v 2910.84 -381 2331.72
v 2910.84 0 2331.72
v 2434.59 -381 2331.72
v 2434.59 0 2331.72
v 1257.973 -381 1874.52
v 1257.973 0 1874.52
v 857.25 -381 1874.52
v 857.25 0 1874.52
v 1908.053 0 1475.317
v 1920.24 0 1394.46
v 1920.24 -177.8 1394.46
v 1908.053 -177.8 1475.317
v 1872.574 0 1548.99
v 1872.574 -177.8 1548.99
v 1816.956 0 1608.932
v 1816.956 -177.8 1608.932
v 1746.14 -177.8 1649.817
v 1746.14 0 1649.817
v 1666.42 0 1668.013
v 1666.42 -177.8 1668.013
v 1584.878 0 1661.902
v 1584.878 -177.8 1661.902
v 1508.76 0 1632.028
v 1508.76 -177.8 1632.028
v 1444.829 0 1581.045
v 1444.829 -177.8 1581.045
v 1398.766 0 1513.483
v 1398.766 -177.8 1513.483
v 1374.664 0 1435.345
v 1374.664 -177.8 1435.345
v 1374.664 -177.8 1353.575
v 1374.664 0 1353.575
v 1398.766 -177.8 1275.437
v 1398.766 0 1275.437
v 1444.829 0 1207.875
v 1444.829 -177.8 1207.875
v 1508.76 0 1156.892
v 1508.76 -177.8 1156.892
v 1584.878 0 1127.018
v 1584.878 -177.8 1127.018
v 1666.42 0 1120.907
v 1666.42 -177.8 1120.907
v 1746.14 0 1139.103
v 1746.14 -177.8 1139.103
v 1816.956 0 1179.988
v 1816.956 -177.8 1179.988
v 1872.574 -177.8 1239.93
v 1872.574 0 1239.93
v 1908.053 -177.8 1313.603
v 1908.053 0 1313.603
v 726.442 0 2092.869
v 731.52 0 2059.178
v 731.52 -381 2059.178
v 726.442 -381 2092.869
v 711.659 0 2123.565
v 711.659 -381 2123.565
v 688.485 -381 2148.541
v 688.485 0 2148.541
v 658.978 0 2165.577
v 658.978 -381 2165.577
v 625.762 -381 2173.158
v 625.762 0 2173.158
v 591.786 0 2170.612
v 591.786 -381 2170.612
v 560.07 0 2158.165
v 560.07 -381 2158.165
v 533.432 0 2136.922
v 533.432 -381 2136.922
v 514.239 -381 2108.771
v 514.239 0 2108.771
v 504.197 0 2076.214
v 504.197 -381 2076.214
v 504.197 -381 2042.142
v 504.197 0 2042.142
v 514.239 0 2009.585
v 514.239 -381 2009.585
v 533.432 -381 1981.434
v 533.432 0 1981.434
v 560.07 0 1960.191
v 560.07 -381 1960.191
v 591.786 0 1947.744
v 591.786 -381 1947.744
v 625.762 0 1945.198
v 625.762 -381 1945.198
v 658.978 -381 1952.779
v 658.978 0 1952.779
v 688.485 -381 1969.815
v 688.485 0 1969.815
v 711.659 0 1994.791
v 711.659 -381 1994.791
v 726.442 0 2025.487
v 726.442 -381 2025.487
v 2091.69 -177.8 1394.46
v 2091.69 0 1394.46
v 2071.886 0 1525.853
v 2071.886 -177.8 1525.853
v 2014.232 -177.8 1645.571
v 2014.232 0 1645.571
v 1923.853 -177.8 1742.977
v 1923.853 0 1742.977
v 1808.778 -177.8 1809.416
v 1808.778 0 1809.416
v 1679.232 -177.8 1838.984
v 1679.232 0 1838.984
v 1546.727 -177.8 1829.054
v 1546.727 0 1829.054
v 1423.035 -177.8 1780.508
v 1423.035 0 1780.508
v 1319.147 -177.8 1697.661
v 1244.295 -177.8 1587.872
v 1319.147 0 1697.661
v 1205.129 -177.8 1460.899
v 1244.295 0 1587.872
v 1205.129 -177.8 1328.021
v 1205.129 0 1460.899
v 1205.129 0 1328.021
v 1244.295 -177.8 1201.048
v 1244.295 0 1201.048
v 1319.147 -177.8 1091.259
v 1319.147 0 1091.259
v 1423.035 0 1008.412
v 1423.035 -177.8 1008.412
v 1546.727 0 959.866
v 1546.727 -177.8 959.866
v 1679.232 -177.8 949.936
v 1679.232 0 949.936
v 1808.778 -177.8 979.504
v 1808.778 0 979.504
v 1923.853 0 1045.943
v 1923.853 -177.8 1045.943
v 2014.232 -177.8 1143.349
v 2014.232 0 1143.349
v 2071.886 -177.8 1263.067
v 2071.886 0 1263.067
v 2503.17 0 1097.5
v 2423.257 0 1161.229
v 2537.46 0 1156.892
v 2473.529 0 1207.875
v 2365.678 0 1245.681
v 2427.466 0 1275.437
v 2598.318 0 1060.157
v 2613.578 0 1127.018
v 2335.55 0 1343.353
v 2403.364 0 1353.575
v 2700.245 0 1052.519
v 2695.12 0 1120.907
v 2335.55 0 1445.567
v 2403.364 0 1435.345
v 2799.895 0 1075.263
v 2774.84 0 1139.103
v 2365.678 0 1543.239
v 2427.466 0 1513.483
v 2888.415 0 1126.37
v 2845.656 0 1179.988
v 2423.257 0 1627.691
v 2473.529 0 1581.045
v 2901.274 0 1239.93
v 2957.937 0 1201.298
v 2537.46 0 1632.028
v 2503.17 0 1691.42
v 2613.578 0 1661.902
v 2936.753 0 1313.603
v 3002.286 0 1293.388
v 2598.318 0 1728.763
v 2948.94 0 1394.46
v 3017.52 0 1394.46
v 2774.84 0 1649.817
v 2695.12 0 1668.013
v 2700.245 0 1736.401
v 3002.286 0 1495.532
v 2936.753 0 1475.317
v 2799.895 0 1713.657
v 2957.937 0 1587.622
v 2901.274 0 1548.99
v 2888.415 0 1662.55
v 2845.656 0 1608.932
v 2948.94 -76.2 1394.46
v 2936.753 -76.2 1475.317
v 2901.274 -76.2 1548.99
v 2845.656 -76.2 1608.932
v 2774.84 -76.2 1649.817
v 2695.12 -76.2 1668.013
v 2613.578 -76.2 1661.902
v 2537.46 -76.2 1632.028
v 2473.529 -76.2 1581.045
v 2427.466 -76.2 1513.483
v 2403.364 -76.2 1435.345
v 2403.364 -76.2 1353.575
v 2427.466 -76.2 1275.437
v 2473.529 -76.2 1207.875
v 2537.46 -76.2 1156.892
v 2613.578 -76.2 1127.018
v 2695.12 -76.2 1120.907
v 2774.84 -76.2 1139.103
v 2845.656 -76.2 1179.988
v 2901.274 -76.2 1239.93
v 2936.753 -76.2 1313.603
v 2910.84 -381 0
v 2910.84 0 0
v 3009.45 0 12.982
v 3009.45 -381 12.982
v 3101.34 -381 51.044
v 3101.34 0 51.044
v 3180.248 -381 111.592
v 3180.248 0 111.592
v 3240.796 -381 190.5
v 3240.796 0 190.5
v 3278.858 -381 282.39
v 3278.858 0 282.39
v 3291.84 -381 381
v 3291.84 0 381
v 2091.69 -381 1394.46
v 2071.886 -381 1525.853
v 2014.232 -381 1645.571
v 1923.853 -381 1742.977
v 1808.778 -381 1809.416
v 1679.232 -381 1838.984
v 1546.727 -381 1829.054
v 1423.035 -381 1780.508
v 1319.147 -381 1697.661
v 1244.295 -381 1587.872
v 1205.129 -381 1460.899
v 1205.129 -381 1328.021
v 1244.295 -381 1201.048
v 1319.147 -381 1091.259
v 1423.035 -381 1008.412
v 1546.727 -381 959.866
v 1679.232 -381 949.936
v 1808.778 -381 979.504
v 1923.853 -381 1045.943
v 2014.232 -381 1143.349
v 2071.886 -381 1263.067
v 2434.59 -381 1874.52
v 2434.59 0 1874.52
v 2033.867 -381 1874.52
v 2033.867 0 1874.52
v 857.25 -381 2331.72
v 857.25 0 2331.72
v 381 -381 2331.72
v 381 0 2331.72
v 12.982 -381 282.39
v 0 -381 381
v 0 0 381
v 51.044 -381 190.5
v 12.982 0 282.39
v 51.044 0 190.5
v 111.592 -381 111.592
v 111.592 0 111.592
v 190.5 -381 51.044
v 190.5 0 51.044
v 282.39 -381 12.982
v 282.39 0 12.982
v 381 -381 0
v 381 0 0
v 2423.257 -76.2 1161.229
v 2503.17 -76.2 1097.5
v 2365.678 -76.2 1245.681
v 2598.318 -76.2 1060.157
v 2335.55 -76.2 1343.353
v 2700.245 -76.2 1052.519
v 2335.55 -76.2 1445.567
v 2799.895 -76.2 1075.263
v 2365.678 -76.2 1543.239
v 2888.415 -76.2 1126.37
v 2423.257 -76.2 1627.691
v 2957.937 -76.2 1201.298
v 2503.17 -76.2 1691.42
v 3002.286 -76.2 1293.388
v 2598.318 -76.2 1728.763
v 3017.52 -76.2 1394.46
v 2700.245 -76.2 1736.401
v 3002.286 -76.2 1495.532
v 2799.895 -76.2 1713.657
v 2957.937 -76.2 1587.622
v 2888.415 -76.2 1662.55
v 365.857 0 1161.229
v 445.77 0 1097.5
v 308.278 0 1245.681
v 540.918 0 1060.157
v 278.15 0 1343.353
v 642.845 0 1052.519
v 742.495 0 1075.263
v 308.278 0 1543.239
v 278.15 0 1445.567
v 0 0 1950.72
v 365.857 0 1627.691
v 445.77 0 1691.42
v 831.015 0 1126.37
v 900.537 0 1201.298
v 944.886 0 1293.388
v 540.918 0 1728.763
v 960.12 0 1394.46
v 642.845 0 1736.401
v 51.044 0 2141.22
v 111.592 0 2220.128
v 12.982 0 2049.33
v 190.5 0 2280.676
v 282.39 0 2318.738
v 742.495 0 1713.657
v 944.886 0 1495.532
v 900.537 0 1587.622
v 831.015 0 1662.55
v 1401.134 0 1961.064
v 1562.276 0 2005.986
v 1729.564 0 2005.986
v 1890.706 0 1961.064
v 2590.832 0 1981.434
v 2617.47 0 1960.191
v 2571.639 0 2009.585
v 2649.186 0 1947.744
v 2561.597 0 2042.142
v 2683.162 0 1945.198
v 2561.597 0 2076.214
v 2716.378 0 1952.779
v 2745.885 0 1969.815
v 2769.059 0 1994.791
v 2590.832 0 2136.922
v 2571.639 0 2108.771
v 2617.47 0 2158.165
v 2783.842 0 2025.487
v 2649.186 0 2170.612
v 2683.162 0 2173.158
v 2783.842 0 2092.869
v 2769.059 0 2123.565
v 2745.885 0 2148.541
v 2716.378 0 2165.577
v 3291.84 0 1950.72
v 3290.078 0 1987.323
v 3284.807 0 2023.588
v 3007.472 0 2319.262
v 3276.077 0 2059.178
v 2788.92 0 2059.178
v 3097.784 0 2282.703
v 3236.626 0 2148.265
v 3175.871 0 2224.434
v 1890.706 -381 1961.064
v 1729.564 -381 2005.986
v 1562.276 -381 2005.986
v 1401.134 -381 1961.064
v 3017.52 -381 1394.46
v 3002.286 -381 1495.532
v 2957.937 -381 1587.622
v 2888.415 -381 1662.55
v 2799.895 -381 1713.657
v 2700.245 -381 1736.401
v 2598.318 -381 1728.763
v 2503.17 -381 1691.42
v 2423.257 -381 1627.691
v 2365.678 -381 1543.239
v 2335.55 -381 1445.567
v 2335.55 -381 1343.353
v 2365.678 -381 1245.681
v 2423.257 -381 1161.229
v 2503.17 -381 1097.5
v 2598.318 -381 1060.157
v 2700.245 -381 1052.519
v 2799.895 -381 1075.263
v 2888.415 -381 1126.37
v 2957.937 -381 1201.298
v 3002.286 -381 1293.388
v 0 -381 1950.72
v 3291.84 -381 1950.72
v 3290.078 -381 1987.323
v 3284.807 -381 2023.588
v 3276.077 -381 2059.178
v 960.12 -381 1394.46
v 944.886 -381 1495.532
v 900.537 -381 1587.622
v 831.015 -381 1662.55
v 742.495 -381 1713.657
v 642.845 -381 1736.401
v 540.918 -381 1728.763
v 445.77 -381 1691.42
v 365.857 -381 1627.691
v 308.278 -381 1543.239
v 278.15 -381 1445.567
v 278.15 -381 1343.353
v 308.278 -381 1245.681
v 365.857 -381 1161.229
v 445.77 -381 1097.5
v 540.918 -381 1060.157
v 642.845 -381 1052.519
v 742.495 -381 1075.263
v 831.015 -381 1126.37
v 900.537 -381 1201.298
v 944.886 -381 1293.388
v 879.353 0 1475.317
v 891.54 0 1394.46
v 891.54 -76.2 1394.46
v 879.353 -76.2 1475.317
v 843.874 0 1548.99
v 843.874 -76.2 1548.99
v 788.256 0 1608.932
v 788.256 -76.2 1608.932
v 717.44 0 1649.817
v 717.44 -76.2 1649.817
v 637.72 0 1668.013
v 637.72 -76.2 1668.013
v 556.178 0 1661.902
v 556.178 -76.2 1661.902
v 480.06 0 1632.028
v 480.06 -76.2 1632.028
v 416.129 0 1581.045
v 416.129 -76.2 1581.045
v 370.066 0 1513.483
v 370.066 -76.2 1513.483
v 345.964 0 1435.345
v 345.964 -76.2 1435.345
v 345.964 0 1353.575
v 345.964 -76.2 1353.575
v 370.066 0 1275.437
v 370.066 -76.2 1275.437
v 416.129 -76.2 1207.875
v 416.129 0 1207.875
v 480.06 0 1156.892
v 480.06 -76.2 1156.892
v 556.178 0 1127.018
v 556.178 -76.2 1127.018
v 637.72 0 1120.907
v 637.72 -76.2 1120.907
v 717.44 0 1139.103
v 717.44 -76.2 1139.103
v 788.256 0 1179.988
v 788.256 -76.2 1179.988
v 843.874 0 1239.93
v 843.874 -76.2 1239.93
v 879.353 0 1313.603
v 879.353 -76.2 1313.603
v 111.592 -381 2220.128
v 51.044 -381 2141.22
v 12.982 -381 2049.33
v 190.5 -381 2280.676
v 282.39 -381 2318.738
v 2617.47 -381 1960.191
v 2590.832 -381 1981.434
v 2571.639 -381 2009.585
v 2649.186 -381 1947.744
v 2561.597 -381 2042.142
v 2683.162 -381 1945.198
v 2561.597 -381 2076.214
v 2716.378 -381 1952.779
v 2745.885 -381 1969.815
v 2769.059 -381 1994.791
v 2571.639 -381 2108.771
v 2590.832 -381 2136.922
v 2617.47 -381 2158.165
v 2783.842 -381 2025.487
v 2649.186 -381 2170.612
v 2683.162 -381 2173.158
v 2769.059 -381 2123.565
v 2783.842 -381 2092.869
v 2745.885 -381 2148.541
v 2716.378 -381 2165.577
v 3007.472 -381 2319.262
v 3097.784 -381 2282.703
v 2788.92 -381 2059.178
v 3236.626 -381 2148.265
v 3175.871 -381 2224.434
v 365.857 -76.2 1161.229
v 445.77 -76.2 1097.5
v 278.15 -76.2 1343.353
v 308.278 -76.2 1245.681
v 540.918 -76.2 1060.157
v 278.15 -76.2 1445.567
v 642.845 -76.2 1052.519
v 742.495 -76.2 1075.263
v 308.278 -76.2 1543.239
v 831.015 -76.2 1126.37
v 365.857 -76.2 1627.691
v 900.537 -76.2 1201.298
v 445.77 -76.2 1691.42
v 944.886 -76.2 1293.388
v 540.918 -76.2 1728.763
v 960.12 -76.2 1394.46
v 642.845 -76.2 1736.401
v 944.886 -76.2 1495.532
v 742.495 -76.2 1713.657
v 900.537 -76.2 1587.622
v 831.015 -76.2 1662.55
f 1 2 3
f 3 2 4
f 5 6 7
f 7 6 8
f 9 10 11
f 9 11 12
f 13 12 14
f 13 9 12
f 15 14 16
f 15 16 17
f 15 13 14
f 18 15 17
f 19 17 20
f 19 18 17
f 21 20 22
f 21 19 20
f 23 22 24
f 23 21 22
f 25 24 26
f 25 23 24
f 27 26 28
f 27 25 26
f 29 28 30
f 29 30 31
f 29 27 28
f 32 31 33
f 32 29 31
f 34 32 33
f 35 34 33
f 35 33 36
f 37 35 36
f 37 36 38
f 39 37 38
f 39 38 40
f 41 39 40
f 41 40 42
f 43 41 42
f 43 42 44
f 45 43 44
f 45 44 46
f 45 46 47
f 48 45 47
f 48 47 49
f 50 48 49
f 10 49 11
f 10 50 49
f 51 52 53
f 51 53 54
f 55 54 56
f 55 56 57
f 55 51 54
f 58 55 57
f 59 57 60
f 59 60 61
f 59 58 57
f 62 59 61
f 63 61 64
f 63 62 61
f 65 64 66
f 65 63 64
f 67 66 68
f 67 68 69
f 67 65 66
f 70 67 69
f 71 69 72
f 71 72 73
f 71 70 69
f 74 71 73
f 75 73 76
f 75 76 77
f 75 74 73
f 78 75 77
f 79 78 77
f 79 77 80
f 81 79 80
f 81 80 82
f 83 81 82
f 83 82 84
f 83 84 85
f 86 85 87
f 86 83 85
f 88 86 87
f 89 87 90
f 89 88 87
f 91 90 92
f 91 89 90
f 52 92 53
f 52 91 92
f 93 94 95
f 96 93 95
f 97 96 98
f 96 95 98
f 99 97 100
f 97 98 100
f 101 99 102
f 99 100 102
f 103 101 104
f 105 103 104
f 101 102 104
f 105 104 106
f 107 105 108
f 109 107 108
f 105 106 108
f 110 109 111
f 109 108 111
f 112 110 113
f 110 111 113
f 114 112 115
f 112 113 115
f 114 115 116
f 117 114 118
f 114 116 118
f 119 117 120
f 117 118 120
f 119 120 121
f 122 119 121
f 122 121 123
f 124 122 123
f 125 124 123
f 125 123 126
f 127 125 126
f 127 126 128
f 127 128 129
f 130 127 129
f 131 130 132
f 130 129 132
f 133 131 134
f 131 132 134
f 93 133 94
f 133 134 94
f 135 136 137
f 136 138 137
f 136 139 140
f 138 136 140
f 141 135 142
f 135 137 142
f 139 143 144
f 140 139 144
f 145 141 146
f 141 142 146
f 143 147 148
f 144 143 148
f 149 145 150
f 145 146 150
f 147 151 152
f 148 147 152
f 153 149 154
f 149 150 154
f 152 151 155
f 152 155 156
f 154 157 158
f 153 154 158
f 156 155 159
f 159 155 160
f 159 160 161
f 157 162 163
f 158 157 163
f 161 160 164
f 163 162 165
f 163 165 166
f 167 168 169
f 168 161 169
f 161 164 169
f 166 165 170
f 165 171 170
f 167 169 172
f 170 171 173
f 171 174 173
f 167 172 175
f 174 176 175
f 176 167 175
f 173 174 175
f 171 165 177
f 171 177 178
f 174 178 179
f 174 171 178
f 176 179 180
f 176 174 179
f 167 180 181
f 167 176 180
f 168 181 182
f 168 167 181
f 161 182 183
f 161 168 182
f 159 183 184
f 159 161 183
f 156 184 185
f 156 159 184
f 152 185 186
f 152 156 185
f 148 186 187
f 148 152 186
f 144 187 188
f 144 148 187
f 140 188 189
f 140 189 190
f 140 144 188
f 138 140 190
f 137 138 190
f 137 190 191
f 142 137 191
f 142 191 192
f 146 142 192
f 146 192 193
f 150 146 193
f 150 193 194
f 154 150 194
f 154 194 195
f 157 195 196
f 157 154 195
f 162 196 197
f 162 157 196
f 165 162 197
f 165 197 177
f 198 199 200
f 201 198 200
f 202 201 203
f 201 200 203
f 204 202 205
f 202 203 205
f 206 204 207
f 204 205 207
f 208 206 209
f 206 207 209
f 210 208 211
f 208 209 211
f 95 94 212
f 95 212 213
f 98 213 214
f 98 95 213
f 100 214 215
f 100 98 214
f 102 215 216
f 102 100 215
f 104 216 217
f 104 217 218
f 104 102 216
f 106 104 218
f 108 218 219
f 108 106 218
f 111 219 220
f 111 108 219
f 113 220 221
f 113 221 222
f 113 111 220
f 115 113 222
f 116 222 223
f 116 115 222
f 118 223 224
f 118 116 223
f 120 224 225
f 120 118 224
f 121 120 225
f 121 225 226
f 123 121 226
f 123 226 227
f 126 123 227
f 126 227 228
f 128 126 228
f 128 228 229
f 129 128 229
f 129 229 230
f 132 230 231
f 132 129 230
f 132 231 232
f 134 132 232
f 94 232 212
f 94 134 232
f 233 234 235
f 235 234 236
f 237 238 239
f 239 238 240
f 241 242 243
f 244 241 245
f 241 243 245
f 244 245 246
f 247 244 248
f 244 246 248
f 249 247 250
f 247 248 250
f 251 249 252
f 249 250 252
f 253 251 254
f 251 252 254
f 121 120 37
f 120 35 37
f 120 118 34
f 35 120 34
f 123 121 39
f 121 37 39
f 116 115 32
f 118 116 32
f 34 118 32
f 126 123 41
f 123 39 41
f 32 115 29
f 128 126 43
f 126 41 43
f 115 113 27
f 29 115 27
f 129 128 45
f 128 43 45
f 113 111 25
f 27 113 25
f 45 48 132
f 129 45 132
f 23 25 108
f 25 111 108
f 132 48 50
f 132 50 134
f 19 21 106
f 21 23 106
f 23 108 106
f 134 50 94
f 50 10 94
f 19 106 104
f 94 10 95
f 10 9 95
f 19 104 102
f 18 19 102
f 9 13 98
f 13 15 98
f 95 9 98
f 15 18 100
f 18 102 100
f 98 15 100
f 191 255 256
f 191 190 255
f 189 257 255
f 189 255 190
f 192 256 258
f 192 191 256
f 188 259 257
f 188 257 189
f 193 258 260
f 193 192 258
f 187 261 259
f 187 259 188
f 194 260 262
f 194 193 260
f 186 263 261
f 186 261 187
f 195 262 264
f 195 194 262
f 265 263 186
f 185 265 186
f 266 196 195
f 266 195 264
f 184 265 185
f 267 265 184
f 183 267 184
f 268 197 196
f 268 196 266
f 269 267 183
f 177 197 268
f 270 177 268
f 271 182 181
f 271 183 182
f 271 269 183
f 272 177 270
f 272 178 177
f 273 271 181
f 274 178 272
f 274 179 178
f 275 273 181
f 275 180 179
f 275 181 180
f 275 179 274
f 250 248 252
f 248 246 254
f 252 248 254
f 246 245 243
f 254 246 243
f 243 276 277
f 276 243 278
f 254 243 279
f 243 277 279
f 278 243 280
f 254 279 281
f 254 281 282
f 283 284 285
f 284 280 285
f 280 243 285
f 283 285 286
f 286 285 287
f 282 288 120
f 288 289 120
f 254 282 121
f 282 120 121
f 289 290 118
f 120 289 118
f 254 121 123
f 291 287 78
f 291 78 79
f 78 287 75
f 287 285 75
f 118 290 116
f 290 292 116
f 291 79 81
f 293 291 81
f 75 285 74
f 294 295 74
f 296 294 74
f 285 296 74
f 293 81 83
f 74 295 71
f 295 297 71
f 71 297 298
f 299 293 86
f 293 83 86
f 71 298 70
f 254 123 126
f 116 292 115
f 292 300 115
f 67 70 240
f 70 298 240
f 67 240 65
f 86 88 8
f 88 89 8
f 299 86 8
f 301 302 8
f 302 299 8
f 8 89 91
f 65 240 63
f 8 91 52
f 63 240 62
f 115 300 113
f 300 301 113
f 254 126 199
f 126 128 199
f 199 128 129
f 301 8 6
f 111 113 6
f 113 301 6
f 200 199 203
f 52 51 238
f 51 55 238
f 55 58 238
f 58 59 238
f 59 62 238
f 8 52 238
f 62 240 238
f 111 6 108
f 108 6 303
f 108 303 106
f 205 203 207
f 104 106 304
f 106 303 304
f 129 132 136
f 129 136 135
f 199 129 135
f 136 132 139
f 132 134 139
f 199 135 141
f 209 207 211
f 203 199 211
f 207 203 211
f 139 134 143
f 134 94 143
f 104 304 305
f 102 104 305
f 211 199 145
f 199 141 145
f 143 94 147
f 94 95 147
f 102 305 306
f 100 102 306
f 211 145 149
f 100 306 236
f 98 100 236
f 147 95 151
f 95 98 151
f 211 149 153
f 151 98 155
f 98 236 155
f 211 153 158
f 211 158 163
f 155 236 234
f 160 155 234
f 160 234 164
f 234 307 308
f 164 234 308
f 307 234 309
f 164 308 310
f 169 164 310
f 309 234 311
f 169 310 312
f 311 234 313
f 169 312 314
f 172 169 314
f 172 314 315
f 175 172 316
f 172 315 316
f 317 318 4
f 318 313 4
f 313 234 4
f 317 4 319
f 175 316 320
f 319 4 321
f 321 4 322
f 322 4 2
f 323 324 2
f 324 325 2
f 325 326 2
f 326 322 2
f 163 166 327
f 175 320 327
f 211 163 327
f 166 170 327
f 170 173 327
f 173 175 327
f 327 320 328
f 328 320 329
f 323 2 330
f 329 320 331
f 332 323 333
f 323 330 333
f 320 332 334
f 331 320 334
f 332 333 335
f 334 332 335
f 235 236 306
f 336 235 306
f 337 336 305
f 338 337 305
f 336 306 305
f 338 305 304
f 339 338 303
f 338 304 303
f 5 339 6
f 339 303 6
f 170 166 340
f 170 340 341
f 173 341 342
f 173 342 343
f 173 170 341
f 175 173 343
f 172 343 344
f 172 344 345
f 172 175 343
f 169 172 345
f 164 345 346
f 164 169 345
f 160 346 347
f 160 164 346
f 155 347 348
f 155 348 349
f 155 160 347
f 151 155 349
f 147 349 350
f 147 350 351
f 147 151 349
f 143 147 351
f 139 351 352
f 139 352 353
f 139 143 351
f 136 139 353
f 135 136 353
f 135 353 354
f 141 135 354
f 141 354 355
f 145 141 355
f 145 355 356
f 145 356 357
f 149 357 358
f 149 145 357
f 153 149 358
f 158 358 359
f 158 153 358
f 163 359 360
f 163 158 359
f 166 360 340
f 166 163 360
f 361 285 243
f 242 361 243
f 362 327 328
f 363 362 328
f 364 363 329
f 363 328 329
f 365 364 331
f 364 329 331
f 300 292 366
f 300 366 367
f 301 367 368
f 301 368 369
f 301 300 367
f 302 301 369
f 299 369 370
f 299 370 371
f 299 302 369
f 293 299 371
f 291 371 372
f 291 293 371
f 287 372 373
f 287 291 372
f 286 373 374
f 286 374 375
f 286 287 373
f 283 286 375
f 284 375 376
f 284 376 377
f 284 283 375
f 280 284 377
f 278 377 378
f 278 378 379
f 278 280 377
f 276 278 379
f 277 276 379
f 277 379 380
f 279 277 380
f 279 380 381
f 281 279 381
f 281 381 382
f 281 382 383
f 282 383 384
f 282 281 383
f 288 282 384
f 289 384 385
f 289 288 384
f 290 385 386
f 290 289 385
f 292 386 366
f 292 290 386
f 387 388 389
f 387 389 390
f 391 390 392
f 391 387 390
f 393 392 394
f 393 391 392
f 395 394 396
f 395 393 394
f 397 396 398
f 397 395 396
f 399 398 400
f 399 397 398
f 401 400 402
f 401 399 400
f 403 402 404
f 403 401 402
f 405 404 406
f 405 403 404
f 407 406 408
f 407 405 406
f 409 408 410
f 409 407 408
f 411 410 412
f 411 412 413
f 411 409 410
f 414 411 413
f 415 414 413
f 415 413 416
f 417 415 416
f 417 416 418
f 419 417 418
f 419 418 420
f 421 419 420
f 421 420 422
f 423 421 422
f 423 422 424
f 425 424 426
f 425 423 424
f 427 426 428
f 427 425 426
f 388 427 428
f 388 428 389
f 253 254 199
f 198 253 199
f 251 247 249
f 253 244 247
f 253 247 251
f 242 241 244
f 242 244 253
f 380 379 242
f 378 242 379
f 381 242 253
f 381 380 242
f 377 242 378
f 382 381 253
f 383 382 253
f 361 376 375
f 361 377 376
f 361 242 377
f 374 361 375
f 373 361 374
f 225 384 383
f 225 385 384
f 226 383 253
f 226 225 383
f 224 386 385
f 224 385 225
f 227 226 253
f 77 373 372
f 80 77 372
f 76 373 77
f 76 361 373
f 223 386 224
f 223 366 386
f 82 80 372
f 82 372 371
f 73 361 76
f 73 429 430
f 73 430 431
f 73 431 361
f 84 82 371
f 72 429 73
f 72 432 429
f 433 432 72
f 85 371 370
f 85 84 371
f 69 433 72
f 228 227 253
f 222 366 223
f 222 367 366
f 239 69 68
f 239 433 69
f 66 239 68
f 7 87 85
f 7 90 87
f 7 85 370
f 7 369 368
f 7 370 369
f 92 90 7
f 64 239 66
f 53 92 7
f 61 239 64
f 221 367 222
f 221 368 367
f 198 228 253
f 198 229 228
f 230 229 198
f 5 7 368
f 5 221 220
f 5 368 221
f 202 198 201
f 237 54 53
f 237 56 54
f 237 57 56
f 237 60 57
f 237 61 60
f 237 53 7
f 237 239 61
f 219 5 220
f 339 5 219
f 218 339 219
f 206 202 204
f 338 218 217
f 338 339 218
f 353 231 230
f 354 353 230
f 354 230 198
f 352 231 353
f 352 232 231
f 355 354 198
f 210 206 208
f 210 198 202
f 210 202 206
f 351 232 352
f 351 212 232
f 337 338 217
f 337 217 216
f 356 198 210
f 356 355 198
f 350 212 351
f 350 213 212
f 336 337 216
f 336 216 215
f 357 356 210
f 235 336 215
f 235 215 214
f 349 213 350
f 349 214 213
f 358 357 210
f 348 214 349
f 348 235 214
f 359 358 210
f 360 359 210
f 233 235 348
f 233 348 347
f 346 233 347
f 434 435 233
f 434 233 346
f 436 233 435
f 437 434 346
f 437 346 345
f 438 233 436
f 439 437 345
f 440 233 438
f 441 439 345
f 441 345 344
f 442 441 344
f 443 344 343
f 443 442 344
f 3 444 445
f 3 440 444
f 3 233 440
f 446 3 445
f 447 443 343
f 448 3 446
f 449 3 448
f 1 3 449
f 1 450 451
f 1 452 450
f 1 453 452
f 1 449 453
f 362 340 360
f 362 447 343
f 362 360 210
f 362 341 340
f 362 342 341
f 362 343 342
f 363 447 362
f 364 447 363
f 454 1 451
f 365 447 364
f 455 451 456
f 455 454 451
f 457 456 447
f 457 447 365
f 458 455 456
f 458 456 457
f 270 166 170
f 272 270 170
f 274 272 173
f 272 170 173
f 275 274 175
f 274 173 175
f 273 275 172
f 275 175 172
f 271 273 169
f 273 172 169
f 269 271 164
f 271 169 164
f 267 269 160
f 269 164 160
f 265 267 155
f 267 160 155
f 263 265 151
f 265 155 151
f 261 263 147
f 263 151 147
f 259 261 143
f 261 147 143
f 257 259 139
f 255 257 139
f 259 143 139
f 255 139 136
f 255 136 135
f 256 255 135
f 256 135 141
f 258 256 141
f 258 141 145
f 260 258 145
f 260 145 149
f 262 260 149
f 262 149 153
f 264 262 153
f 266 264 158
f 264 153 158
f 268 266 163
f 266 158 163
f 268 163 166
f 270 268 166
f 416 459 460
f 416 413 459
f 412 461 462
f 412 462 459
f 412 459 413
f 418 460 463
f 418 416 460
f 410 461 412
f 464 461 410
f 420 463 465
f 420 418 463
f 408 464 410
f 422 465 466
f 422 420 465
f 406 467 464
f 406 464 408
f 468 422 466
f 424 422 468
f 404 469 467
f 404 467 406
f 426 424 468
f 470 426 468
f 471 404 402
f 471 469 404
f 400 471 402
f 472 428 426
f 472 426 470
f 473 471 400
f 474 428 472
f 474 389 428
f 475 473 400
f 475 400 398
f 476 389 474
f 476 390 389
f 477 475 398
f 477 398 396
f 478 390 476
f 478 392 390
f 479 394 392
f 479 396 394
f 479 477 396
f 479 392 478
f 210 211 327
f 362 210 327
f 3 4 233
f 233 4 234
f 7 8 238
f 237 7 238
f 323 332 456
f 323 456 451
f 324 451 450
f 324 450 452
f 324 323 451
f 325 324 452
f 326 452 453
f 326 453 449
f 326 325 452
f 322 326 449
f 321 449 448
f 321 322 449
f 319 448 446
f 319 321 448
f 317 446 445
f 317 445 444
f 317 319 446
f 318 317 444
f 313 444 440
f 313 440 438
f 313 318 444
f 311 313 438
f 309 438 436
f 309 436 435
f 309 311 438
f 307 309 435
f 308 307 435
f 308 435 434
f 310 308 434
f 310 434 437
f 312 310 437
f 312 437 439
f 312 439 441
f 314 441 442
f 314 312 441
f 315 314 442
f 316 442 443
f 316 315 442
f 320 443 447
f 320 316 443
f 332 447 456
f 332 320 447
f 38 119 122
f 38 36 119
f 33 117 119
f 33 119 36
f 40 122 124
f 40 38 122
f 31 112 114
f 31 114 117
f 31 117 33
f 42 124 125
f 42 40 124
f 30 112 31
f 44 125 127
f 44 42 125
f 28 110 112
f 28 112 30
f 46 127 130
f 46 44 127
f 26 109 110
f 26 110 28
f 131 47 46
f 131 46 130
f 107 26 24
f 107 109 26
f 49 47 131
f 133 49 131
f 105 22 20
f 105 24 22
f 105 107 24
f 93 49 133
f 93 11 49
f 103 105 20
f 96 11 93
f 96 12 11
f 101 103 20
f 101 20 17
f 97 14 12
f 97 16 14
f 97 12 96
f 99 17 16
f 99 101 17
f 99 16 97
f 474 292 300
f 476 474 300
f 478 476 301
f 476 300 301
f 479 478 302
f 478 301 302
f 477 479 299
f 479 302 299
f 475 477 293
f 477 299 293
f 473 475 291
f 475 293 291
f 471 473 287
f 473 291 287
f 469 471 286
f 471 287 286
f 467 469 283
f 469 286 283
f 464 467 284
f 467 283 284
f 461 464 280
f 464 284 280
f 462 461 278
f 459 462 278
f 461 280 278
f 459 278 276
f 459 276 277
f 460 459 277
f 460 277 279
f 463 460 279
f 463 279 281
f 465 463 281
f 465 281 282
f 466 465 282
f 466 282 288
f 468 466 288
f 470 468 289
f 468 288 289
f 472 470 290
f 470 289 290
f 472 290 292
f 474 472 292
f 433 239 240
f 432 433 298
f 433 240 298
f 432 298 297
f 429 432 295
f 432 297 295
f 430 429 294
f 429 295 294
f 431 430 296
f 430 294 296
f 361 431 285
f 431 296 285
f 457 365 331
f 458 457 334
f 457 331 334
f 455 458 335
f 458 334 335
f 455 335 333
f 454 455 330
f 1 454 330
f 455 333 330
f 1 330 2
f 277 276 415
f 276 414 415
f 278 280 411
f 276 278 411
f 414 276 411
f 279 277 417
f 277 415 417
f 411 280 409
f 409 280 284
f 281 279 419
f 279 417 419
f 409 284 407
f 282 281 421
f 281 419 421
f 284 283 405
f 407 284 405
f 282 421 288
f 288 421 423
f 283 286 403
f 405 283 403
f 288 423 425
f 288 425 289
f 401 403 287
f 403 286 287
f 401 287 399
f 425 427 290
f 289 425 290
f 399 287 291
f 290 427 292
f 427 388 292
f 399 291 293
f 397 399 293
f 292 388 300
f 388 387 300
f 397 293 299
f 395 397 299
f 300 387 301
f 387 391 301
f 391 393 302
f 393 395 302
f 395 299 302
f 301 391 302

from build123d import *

# Parameters (mm, degrees)
F0_R     = 342.9
F0_R_2   = 274.32
F1_DEPTH = 76.2
F0_R_3   = 445.77
F2_DEPTH = 177.8
F0_R_4   = 114.3
F3_DEPTH = 381


with BuildPart() as f1:
    # F0 (on Front) → F1 (new body)
    with BuildSketch(Plane.XZ):
        with Locations((617.22, 1394.46)):
            Circle(F0_R)
        with Locations((617.22, 1394.46)):
            Circle(F0_R_2, mode=Mode.SUBTRACT)
        with Locations((2674.62, 1394.46)):
            Circle(F0_R)
        with Locations((2674.62, 1394.46)):
            Circle(F0_R_2, mode=Mode.SUBTRACT)
    extrude(amount=F1_DEPTH)


with BuildPart() as f2:
    # F0 (on Front) → F2 (new body)
    with BuildSketch(Plane.XZ):
        with Locations((1645.92, 1394.46)):
            Circle(F0_R_3)
        with Locations((1645.92, 1394.46)):
            Circle(F0_R_2, mode=Mode.SUBTRACT)
    extrude(amount=F2_DEPTH)


with BuildPart() as f3:
    # F0 (on Front) → F3 (new body)
    with BuildSketch(Plane.XZ):
        with BuildLine():
            Line((0, 1394.46), (0, 381))
            ThreePointArc((0, 381), (111.592316, 111.592316), (381, 0))
            Line((381, 0), (2910.84, 0))
            ThreePointArc((2910.84, 0), (3180.247684, 111.592316), (3291.84, 381))
            Line((3291.84, 381), (3291.84, 1950.72))
            ThreePointArc((3291.84, 1950.72), (3287.878586, 2005.518765), (3276.076721, 2059.178))
            ThreePointArc((3276.076721, 2059.178), (3138.697962, 2256.075119), (2910.84, 2331.72))
            Line((2910.84, 2331.72), (2674.62, 2331.72))
            Line((2674.62, 2331.72), (2434.59, 2331.72))
            Line((2434.59, 2331.72), (2434.59, 1874.52))
            Line((2434.59, 1874.52), (2033.867064, 1874.52))
            ThreePointArc((2033.867064, 1874.52), (1645.92, 2011.68), (1257.972936, 1874.52))
            Line((1257.972936, 1874.52), (857.25, 1874.52))
            Line((857.25, 1874.52), (857.25, 2331.72))
            Line((857.25, 2331.72), (617.22, 2331.72))
            Line((617.22, 2331.72), (381, 2331.72))
            ThreePointArc((381, 2331.72), (111.592316, 2220.127684), (0, 1950.72))
            Line((0, 1950.72), (0, 1394.46))
        make_face()
        with Locations((617.22, 1394.46)):
            Circle(F0_R, mode=Mode.SUBTRACT)
        with Locations((617.22, 2059.178)):
            Circle(F0_R_4, mode=Mode.SUBTRACT)
        with Locations((1645.92, 1394.46)):
            Circle(F0_R_3, mode=Mode.SUBTRACT)
        with Locations((2674.62, 1394.46)):
            Circle(F0_R, mode=Mode.SUBTRACT)
        with Locations((2674.62, 2059.178)):
            Circle(F0_R_4, mode=Mode.SUBTRACT)
    extrude(amount=F3_DEPTH)


solid = Compound([f1.part, f2.part, f3.part])
